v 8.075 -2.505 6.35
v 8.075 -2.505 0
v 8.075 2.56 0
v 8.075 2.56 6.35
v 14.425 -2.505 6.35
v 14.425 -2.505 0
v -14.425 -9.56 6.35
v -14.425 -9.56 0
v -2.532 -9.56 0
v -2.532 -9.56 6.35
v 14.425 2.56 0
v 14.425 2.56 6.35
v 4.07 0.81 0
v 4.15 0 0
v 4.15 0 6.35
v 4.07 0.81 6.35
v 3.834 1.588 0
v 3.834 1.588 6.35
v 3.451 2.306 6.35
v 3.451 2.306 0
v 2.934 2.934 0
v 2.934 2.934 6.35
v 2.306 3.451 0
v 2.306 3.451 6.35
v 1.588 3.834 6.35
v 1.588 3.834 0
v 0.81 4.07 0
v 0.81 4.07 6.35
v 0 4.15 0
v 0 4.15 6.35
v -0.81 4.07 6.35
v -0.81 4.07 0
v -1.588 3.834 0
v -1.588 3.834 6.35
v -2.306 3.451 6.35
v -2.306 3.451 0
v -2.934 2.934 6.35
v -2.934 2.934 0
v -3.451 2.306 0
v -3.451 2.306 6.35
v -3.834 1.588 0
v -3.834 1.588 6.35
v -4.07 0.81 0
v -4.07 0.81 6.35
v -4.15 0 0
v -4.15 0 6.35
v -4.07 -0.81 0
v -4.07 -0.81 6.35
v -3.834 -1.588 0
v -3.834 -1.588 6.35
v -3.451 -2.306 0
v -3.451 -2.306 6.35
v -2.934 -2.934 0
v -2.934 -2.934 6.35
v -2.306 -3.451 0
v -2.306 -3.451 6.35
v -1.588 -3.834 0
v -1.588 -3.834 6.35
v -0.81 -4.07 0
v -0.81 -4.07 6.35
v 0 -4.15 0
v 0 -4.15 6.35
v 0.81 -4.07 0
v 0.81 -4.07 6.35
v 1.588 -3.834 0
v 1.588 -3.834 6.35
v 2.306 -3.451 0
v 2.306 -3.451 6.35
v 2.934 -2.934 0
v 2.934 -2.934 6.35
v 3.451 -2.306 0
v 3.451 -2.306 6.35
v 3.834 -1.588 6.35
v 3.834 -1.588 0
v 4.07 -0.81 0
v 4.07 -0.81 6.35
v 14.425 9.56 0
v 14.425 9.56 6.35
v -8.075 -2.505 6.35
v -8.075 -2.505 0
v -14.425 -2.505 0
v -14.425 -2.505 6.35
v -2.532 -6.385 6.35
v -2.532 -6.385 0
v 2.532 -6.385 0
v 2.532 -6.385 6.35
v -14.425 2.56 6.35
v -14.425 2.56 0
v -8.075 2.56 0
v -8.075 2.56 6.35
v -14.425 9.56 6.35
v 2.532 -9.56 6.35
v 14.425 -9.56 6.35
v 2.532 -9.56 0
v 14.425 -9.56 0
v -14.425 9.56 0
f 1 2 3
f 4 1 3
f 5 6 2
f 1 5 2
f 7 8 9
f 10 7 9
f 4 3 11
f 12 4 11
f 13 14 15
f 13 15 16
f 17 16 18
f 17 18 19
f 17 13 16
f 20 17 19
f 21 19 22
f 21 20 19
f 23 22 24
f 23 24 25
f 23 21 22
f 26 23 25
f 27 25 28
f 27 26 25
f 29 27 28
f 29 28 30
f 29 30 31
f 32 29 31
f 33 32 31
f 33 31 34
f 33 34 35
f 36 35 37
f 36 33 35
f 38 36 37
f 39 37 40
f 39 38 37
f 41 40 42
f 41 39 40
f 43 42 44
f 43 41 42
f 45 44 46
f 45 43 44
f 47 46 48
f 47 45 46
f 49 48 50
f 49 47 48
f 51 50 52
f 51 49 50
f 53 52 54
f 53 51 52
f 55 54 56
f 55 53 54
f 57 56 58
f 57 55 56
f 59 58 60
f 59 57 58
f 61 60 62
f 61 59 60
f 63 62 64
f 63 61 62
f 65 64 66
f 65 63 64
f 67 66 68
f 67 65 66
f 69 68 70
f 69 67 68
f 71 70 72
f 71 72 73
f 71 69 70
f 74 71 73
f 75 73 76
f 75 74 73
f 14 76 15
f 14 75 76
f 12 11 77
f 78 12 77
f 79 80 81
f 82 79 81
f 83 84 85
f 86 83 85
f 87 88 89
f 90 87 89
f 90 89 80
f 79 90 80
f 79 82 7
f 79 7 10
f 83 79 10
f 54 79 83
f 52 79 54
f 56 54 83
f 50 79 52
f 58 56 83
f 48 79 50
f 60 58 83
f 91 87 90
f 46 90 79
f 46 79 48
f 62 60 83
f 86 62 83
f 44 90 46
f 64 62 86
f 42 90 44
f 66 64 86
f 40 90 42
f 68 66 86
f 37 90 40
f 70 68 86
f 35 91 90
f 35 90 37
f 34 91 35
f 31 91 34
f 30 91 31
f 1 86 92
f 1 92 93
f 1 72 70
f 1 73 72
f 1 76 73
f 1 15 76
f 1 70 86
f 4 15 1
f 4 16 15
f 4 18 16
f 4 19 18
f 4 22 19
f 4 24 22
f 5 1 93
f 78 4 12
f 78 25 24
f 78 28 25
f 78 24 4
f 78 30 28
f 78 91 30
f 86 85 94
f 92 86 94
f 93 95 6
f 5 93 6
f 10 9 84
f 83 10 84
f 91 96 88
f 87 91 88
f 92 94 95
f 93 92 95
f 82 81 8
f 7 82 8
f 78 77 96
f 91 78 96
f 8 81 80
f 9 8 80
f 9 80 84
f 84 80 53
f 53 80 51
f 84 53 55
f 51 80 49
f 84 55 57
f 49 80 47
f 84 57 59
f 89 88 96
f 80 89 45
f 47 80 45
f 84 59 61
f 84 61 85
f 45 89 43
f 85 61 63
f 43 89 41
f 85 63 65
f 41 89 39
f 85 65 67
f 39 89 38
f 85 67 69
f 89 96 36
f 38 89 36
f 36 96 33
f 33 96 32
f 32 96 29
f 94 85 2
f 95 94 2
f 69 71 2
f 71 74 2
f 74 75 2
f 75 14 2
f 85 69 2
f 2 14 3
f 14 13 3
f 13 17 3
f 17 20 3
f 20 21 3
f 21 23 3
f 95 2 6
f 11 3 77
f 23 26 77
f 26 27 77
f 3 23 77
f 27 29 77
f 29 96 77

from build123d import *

# Parameters (mm, degrees)
SKETCH1_R           = 4.15
BOSS_EXTRUDE1_DEPTH = 6.35


with BuildPart() as part:
    # Sketch1 → Boss-Extrude1 (new body)
    with BuildSketch(Plane.XY):
        Polygon((-14.425, 9.56), (-14.425, 2.56), (-8.075, 2.56), (-8.075, -2.505147932), (-14.425, -2.505147932), (-14.425, -9.56), (-2.5325, -9.56), (-2.5325, -6.385), (0, -6.385), (2.5325, -6.385), (2.5325, -9.56), (14.425, -9.56), (14.425, -2.505147932), (8.075, -2.505147932), (8.075, 2.56), (14.425, 2.56), (14.425, 9.56), align=None)
        Circle(SKETCH1_R, mode=Mode.SUBTRACT)
    extrude(amount=BOSS_EXTRUDE1_DEPTH)


solid = part.part
